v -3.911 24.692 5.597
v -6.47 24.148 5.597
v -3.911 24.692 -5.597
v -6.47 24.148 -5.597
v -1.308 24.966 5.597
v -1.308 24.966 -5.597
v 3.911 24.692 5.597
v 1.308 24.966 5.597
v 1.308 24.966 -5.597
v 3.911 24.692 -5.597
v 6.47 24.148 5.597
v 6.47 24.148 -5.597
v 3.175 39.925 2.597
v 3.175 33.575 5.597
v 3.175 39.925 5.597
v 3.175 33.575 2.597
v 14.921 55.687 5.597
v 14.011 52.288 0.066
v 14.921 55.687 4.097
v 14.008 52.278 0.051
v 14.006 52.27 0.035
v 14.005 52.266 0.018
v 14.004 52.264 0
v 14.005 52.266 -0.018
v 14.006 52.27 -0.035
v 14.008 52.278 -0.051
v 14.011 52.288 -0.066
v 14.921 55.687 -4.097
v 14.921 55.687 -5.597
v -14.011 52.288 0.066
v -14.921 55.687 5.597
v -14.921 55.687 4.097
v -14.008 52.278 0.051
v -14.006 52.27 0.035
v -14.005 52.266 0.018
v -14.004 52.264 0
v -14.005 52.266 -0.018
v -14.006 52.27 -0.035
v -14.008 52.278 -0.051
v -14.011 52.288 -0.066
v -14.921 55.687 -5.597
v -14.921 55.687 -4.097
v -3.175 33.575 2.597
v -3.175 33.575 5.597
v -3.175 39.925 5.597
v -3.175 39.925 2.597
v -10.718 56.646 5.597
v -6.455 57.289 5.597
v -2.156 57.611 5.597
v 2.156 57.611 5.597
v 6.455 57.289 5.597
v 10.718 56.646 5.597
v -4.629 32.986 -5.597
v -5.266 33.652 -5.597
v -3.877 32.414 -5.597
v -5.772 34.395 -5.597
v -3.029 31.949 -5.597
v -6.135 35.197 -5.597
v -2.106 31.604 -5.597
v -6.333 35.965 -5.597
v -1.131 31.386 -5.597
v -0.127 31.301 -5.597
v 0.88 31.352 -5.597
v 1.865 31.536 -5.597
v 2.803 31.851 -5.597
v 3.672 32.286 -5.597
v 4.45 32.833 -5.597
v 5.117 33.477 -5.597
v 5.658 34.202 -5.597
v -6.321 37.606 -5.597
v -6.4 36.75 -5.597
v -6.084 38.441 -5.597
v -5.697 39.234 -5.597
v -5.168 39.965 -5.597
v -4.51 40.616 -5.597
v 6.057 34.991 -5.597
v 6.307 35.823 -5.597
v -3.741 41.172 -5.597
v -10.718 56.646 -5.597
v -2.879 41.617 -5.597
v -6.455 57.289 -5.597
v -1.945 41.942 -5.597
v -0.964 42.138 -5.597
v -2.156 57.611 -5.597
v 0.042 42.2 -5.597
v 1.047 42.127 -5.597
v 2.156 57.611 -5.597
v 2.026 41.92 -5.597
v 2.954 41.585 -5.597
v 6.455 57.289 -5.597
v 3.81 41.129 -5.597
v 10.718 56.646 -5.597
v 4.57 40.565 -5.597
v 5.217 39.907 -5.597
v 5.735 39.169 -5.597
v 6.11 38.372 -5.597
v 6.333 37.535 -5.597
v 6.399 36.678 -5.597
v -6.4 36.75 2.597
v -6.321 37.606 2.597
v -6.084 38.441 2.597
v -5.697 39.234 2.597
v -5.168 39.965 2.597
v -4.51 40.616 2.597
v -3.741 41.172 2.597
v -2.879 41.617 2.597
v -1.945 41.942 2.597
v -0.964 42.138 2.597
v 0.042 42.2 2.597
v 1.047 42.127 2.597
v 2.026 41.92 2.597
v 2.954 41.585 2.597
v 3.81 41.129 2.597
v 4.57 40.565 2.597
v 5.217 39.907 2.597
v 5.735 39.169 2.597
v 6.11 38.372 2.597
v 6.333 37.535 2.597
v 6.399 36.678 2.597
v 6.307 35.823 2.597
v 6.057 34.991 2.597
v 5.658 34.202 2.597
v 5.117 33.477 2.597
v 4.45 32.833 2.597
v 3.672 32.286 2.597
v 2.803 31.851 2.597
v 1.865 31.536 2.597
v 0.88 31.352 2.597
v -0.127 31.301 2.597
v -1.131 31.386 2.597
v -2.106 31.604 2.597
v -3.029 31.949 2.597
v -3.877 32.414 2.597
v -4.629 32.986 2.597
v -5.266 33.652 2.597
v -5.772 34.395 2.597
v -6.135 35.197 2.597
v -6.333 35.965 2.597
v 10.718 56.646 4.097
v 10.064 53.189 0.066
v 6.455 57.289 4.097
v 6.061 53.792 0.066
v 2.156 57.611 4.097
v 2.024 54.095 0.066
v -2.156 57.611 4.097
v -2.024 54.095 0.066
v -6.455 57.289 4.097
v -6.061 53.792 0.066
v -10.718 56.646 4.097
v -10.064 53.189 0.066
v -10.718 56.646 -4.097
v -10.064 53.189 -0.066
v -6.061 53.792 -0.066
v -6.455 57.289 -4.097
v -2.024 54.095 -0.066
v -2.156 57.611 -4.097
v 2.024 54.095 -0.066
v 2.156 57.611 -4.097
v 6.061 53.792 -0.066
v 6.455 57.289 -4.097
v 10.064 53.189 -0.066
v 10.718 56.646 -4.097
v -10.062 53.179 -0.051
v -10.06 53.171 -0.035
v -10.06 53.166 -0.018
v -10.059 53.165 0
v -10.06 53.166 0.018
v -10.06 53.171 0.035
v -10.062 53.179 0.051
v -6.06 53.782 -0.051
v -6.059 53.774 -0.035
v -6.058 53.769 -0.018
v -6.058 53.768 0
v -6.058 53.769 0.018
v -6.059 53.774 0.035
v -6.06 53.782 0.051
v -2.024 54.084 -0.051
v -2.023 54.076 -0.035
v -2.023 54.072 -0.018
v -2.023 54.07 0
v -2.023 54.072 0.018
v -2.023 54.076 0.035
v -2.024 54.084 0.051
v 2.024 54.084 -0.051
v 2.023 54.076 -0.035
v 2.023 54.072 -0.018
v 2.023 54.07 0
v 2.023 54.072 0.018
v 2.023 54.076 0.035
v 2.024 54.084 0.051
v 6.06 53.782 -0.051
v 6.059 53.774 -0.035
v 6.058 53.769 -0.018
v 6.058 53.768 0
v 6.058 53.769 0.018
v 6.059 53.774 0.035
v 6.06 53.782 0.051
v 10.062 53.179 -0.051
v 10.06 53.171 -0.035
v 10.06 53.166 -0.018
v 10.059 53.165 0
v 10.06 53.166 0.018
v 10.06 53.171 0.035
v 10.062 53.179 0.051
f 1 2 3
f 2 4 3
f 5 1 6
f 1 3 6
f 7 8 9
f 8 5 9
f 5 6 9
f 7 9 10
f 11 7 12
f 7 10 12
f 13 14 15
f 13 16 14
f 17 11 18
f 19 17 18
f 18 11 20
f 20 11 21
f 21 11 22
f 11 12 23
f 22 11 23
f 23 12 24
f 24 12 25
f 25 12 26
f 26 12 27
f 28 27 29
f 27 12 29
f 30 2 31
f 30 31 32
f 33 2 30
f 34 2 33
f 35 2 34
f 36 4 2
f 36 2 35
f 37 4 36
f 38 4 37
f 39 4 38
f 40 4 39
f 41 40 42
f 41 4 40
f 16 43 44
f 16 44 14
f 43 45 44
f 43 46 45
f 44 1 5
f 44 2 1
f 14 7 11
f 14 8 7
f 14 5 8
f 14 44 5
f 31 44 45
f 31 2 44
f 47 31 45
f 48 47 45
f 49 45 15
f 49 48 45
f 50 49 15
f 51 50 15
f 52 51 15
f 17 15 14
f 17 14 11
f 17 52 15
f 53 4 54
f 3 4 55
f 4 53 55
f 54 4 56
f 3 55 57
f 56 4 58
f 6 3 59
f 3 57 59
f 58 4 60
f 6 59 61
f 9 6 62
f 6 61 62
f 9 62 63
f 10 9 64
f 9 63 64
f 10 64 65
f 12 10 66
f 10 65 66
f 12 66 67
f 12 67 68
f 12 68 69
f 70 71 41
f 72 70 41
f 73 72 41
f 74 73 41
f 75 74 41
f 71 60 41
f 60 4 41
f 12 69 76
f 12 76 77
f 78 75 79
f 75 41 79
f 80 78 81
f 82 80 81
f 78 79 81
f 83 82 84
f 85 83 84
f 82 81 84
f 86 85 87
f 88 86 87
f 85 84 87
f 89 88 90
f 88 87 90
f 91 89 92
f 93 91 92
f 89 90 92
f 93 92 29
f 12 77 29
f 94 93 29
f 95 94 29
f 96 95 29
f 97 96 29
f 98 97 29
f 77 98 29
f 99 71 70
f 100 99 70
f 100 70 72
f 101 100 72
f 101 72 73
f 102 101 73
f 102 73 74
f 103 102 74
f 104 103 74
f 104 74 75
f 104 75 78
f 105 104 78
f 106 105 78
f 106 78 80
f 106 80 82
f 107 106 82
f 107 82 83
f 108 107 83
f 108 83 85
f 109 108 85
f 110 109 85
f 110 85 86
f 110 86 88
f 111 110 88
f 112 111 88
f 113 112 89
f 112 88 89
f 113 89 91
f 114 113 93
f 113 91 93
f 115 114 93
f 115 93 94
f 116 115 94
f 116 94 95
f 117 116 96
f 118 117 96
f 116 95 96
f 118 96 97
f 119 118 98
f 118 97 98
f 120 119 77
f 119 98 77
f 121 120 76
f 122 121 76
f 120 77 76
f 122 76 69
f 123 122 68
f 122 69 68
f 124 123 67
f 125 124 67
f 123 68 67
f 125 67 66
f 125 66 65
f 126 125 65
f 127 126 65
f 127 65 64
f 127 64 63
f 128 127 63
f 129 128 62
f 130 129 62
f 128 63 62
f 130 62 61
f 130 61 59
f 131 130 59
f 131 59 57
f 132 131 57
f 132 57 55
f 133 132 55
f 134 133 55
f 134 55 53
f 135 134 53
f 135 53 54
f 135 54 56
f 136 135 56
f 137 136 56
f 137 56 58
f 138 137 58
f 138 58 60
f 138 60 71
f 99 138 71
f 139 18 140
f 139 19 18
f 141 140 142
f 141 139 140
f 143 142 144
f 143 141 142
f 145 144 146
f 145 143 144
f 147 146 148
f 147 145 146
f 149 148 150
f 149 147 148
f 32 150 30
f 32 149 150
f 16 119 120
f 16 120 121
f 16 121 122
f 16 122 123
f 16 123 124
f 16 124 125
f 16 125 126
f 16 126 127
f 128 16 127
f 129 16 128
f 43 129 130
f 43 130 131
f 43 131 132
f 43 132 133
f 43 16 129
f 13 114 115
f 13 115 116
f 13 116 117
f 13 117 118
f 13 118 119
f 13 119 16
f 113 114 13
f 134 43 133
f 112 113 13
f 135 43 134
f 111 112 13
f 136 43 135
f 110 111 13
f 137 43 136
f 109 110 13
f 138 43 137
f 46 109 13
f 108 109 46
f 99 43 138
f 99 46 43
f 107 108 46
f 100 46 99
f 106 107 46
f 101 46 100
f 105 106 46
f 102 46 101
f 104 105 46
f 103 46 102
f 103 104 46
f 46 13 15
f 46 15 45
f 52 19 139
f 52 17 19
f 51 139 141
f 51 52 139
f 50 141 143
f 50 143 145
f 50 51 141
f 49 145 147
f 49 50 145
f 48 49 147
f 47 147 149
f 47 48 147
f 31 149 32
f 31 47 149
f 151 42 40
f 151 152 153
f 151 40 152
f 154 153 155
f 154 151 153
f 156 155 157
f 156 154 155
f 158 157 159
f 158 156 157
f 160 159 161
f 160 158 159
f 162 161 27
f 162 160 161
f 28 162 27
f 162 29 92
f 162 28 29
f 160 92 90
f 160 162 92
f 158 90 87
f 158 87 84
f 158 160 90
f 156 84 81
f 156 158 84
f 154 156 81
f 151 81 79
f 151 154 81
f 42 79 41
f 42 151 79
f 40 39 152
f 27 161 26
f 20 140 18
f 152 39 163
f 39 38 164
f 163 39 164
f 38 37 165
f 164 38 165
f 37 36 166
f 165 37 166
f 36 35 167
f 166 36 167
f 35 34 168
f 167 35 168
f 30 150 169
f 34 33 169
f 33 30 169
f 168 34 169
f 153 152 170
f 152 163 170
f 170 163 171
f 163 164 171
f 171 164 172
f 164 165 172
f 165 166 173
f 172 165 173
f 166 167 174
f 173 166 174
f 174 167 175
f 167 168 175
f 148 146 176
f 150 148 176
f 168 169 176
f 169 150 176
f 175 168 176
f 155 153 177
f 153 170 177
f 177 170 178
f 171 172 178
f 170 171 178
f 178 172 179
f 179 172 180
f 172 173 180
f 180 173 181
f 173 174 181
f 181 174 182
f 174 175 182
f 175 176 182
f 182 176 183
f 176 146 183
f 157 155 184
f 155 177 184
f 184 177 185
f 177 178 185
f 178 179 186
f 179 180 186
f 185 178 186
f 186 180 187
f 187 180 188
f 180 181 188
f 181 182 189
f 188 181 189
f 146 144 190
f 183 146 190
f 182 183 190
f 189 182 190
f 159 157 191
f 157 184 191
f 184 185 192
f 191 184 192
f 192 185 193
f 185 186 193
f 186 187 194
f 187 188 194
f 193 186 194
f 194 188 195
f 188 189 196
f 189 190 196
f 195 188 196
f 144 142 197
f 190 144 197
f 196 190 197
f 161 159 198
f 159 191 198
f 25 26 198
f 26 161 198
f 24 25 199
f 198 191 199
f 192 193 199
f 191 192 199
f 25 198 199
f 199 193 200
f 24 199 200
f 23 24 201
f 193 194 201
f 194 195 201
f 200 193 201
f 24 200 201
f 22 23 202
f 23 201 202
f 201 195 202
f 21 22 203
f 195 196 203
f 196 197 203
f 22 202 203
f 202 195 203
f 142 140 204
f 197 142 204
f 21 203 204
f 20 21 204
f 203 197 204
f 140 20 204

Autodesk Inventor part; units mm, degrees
ref_plane "YZ Plane" through (0, 0, 0) normal (1, 0, 0) x (0, 1, 0)
ref_plane "XZ Plane" through (0, 0, 0) normal (0, 1, 0) x (-1, 0, 0)
sketch "Sketch1" plane through (0, 0, 0) normal (0, 0, 1) x (1, 0, 0)
  circle A0 centre (0, 0) radius 59.2469 construction
  line L0 (0, 0) -> (59.2469, 0)
  line L1 (0, 0) -> (59.2469, 4.025)
  line L2 (59.2469, 0) -> (59.2469, 4.025)
  circle A1 centre (0, 0) radius 75
  point P0 (56.8, 0)
  dimension "d56" = 59.2469
  dimension "d57" = 4.025
  dimension "d400" = 75
  dimension "d495" = 2.5
  dimension "d496" = 8
  dimension "d531" = 5.5
  dimension "d532" = 5.5
  dimension "d533" = 5.5
  dimension "d537" = 24.5
  dimension "d538" = 3
  dimension "d543" = 5.5
  dimension "d549" = 3
  dimension "d550" = 3
  dimension "d567" = 5.5
  dimension "d568" = 5.5
sketch "Sketch7" plane through (0, 0, 0) normal (0, 1, 0) x (-1, 0, 0)
  line L0 (0, 0) -> (0, 61.9844)
  line L1 (0, 0) -> (-59.2469, 0) construction
  line L2 (0, 61.9844) -> (-59.2469, 0) construction
  line L3 (0, 61.9844) -> (-64.8494, 0) construction
  line L4 (0, 61.9844) -> (-58.9939, -5.5968) construction
  line L5 (0, 0) -> (0, -61.9844)
  line L6 (0, -61.9844) -> (-59.2469, 0) construction
  line L7 (0, -61.9844) -> (-64.8494, 0) construction
  line L8 (0, -61.9844) -> (-58.9939, 5.5968) construction
  line L9 (-58.9939, 5.5968) -> (-64.8494, 0) construction
  line L10 (-54.1083, 0) -> (-62.8579, -8.363) construction
  line L11 (-54.1083, 0) -> (-38.773, -14.6579) construction
  line L12 (0, -94.3812) -> (0, 132.3969) projected
  line L13 (-75, -5.9919) -> (-75, 6.008)
  line L14 (105, 0) -> (-105, 0) projected
  line L15 (-62.0481, 2.6775) -> (-56.4456, -2.6775) construction
  line L16 (-56.4456, 2.6775) -> (-62.0481, -2.6775) construction
  line L17 (-26.151, -15.9303) -> (-40.3783, -15.9303) construction
  line L18 (-40.3783, -15.9303) -> (-40.3783, -12.7539) construction
  line L19 (-40.3783, -12.7539) -> (-26.151, -12.7539) construction
  line L20 (-26.151, -12.7539) -> (-26.151, -15.9303) construction
  point P0 (-75, 0)
  dimension "Roller_Side_difference" = -0.0002
  dimension "d90" = 61.9844
  dimension "d201" = 75
  dimension "d343" = 92.587
  dimension "d344" = 92.588
  dimension "d367" = 8.1
sketch "Roller1" plane through (0, 0, 0) normal (0, 1, 0) x (-1, 0, 0)
  line L0 (0, 61.9844) -> (-58.9939, -5.5968) construction
  line L1 (0, 61.9844) -> (-64.8494, 0) construction
  line L2 (-54.1083, 0) -> (-38.773, -14.6579) construction
  line L3 (0, -61.9844) -> (-64.8494, 0) construction
  line L4 (-54.0606, 0.0927) -> (-58.9462, -5.5041)
  line L5 (-58.9462, -5.5041) -> (-64.7589, 0.0519)
  line L6 (-64.7589, 0.0519) -> (-59.3884, 5.1851)
  line L7 (-59.3884, 5.1851) -> (-54.0606, 0.0927)
  line L8 (-56.0019, 1.9482) -> (-61.1299, -3.4168)
  line L9 (-61.8526, -2.7261) -> (-56.7246, 2.639)
  point P0 (0, 0)
  dimension "d345" = 0.025
  dimension "d346" = 0.025
  dimension "d347" = 0.1
  dimension "d348" = 0.1
  dimension "d349" = 272.588
  dimension "d350" = 272.587
  dimension "d617" = 0.9997
sketch "Roller2" plane through (0, 0, 0) normal (0, 1, 0) x (-1, 0, 0)
  line L0 (0, -61.9844) -> (-58.9939, 5.5968) construction
  line L1 (-54.1083, 0) -> (-62.8579, -8.363) construction
  line L2 (0, -61.9844) -> (-64.8494, 0) construction
  line L3 (0, 61.9844) -> (-64.8494, 0) construction
  line L4 (-58.9956, 5.5606) -> (-54.1429, 0.0016)
  line L5 (-54.1429, 0.0016) -> (-59.4789, -5.0987)
  line L6 (-59.4789, -5.0987) -> (-64.8132, 0)
  line L7 (-64.8132, 0) -> (-58.9956, 5.5606)
  line L8 (-61.9044, 2.7803) -> (-56.8109, -2.5486)
  line L9 (-61.1815, 3.4713) -> (-56.088, -1.8576)
  point P0 (0, 0)
  dimension "d351" = 0.025
  dimension "d352" = 0.025
  dimension "d354" = 0.025
  dimension "d355" = 92.587
  dimension "d356" = 92.588
  dimension "d370" = 0.025
  dimension "d371" = 1
sketch "Sketch22" plane through (0, 0, 0) normal (0, 1, 0) x (-1, 0, 0)
  line L0 (-31.756, 8.0215) -> (-17.5287, 8.0215) construction
  line L1 (-17.5287, 8.0215) -> (-17.5287, 4.8451) construction
  line L2 (-17.5287, 4.8451) -> (-31.756, 4.8451) construction
  line L3 (-31.756, 4.8451) -> (-31.756, 8.0215) construction
  point P0 (0, 0)
  dimension "Roller_Side_difference" = -0.0002
sketch "Sketch2" plane through (0, 0, 0) normal (0, 1, 0) x (-1, 0, 0)
  line L0 (0, 0) -> (0, 59.2469) construction
  line L1 (0, 0) -> (-59.2469, 0) projected
  line L2 (0, 0) -> (0, -59.2469)
  line L3 (0, -59.2469) -> (-59.2469, 0) construction
  line L4 (0, 59.2469) -> (-59.2469, 0) construction
  line L5 (-50.4879, 53.555) -> (0, 59.2469) construction
  line L6 (-29.7354, 7.189) -> (0, 59.2469) construction
  line L7 (-29.7354, 7.189) -> (0, -59.2469) construction
  line L8 (-48.8381, -26.254) -> (0, -59.2469) construction
  point P0 (-40.4258, 18.8211)
sketch "Sketch23" plane through (0, 0, 0) normal (0, 1, 0) x (-1, 0, 0)
  line L0 (0, -61.9844) -> (-58.9939, 5.5968) construction
  line L1 (0, -61.9844) -> (-64.8494, 0) construction
  line L2 (0, 61.9844) -> (-58.9939, -5.5968) construction
  line L3 (-58.9939, 5.5968) -> (-64.8494, 0) construction
  line L4 (0, 61.9844) -> (-64.8494, 0) construction
  line L5 (-58.9939, 5.5968) -> (-58.9939, -5.5968) construction
  line L6 (105, 0) -> (-105, 0) projected
  line L7 (-57.6514, 4.0968) -> (-54.1326, 0.0658)
  line L8 (-54.1326, -0.0658) -> (-57.6514, -4.0968)
  line L9 (-60.5995, 4.0968) -> (-64.81, 0.0723)
  line L10 (-64.81, -0.0723) -> (-60.5995, -4.0968)
  arc A0 (-64.81, 0.0723) -> (-64.81, -0.0723) centre (-64.7409, 0) ccw
  arc A1 (-54.1326, -0.0658) -> (-54.1326, 0.0658) centre (-54.2079, 0) ccw
  line L11 (-57.6514, 4.0968) -> (-57.6514, 5.5968)
  line L12 (-57.6514, 5.5968) -> (-25, 5.5968)
  line L13 (-25, 5.5968) -> (-25, -5.5968)
  line L14 (-25, -5.5968) -> (-57.6514, -5.5968)
  line L15 (-57.6514, -5.5968) -> (-57.6514, -4.0968)
  line L16 (-60.5995, 4.0968) -> (-60.5995, 5.5968)
  line L17 (-60.5995, 5.5968) -> (-75, 5.5968)
  line L18 (-75, 5.5968) -> (-75, -5.5968)
  line L19 (-60.5995, -4.0968) -> (-60.5995, -5.5968)
  line L20 (-60.5995, -5.5968) -> (-75, -5.5968)
  line L21 (-58.9939, 5.5968) -> (-58.9939, 5.5968)
  line L22 (-58.9939, -5.5968) -> (-58.9939, -5.5968)
  line L23 (0, -94.3812) -> (0, 132.3969) projected
  line L24 (-64.8856, 0) -> (-75, 0)
  point P0 (0, 0)
  point P1 (-54.0752, 0)
  point P2 (-64.8409, 0)
  point P3 (-75, 0)
  dimension "d378" = 90
  dimension "d379" = 0.1
  dimension "d380" = 0.025
  dimension "d381" = 0.025
  dimension "d382" = 0.025
  dimension "d383" = 0.025
  dimension "d384" = 11.1935
  dimension "d385" = 0
  dimension "d386" = 0
  dimension "d391" = 25
  dimension "d392" = 75
  dimension "d393" = 1.5
  dimension "d394" = 1.5
  dimension "d395" = 1.5
  dimension "d396" = 1.5
revolve "RevRoller1" [suppressed]
fillet "Fillet1" [suppressed]
sketch "Sketch48" plane through (56.7246, 0, 2.639) normal (-0.691, 0, 0.7229) x (0.7229, 0, 0.691)
  line L0 (-2.5, 0.25) -> (2.5, 0.25)
  line L1 (2.5, 0.25) -> (2.5, -0.25)
  line L2 (2.5, -0.25) -> (-2.5, -0.25)
  line L3 (-2.5, -0.25) -> (-2.5, 0.25)
  line L4 (-2.5, 0.25) -> (2.5, -0.25) construction
  line L5 (2.5, 0.25) -> (-2.5, -0.25) construction
  line L6 (-0.25, -2.5) -> (0.25, -2.5)
  line L7 (0.25, -2.5) -> (0.25, 2.5)
  line L8 (0.25, 2.5) -> (-0.25, 2.5)
  line L9 (-0.25, 2.5) -> (-0.25, -2.5)
  line L10 (-0.25, -2.5) -> (0.25, 2.5) construction
  line L11 (0.25, -2.5) -> (-0.25, 2.5) construction
  point P0 (-42.8293, 0)
  point P1 (0, 0)
  point P2 (-0.25, 0.25)
  point P3 (-0.25, -0.25)
  point P4 (0.25, -0.25)
  point P5 (0.25, 0.25)
  dimension "d621" = 5
  dimension "d622" = 0.5
  dimension "d623" = 0.5
  dimension "d624" = 5
extrude "Extrusion39" [suppressed]
sketch "Sketch40" plane through (0, 0, -5.231) normal (0, 0, -1) x (-1, 0, 0)
  circle A0 centre (53.5, 0) radius 2.75 projected
  circle A1 centre (0, 0) radius 53.5 projected
  point P0 (53.4293, 2.7491)
  point P1 (53.4293, -2.7491)
  dimension "d585" = 8
  dimension "d587" = 1.75
  dimension "d589" = 3
  dimension "d592" = 2
  dimension "d593" = 12
  dimension "d594" = 12
  dimension "d611" = 360
pattern_circular "Circular Pattern13" [suppressed]
feature "Move Body7" [suppressed]
revolve "Revolution13" [suppressed]
fillet "Fillet3" [suppressed]
pattern_circular "Circular Pattern14" [suppressed]
feature "Move Body6" [suppressed]
revolve "Revolution14" add sketch "Sketch23" angle 360 about axis through (0, 0, -10) along (0, 0, 1) contours A1 L7 L11 L12 L13 L6 | L6 L13 L14 L15 L8 A1
revolve "OuterRim_Top2" [suppressed]
revolve "OuterRim_Bottom2" [suppressed]
ref_plane "Work Plane8" through (0, 0, 20) normal (0, 0, 1) x (1, 0, 0)
sketch "Sketch49" plane through (0, 0, 20) normal (0, 0, 1) x (1, 0, 0)
  circle A0 centre (0, 0) radius 75 projected
  circle A1 centre (0, 0) radius 60.5995 projected
  circle A2 centre (0, 0) radius 57.6514 projected
  circle A3 centre (0, 0) radius 25 projected
  circle A4 centre (0, 0) radius 69
  circle A5 centre (0, 0) radius 36.75
  point P0 (0, 69)
  point P1 (0, 36.75)
  point P2 (-40.5572, 55.8222)
  dimension "d629" = 69
  dimension "d630" = 73.5
  dimension "d649" = 36
sketch "Sketch50" plane through (0, 0, 5.5968) normal (0, 0, 1) x (1, 0, 0)
  point P0 (0, 0)
  point P1 (0, 69)
sketch "Sketch51" plane through (0, 0, -5.5968) normal (0, 0, -1) x (-1, 0, 0)
  circle A0 centre (0, 0) radius 75 projected
  circle A1 centre (0, 69) radius 2.75
  circle A2 centre (0, 69) radius 1.5
  circle A3 centre (-40.5572, 55.8222) radius 3.5
  circle A4 centre (-40.5572, 55.8222) radius 2
  dimension "d633" = 36
  dimension "d635" = 5.5
  dimension "d636" = 3
  dimension "d637" = 7
  dimension "d638" = 4
extrude "Extrusion40" [suppressed]
extrude "Extrusion41" [suppressed]
extrude "Extrusion42" [suppressed]
extrude "Extrusion43" [suppressed]
sketch "Sketch52" plane through (0, 0, 5.5968) normal (0, 0, 1) x (1, 0, 0)
  circle A0 centre (0, 69) radius 1.5
  circle A1 centre (-40.5572, 55.8222) radius 2
  line L0 (2.75, 67.4123) -> (0, 65.8246)
  line L1 (0, 65.8246) -> (-2.75, 67.4123)
  line L2 (-2.75, 67.4123) -> (-2.75, 70.5877)
  line L3 (-2.75, 70.5877) -> (0, 72.1754)
  line L4 (0, 72.1754) -> (2.75, 70.5877)
  line L5 (2.75, 70.5877) -> (2.75, 67.4123)
  circle A2 centre (0, 0) radius 75 projected
  line L6 (-39.2656, 58.7231) -> (-37.3992, 56.1541)
  line L7 (-36.5379, 56.2446) -> (-38.1817, 52.5526)
  line L8 (-38.1817, 52.5526) -> (-42.201, 52.1301)
  line L9 (-42.201, 52.1301) -> (-44.5765, 55.3997)
  line L10 (-44.5765, 55.3997) -> (-42.9327, 59.0918)
  line L11 (-42.9327, 59.0918) -> (-38.9134, 59.5142)
  line L12 (-38.9134, 59.5142) -> (-36.5379, 56.2446)
  dimension "d651" = 3
  dimension "d652" = 4
  dimension "d655" = 36
  dimension "d657" = 7
  dimension "d658" = 5.5
extrude "Extrusion44" [suppressed]
extrude "Extrusion45" [suppressed]
extrude "Extrusion46" [suppressed]
extrude "Extrusion47" [suppressed]
pattern_circular "Circular Pattern32" [suppressed]
pattern_circular "Circular Pattern33" [suppressed]
sketch "Sketch57" plane through (0, 0, -5.5968) normal (0, 0, -1) x (-1, 0, 0)
  line L0 (-3.175, 39.925) -> (3.175, 39.925)
  line L1 (3.175, 39.925) -> (3.175, 33.575)
  line L2 (3.175, 33.575) -> (-3.175, 33.575)
  line L3 (-3.175, 33.575) -> (-3.175, 39.925)
  line L4 (-3.175, 39.925) -> (3.175, 33.575) construction
  line L5 (3.175, 39.925) -> (-3.175, 33.575) construction
  ellipse E0 centre (0, 36.75) end of major axis (6.4, 36.75) minor radius 5.45
  point P0 (0, 0)
  dimension "d694" = 6.35
  dimension "d695" = 6.35
  dimension "d696" = 6.4
  dimension "d697" = 5.45
extrude "Extrusion50" cut sketch "Sketch57" against normal blind 11.194 contours L0 L1 L2 L3
extrude "Extrusion51" cut sketch "Sketch57" against normal blind 8.194 contours L0 L1 L2 L3 | E0
pattern_circular "Circular Pattern34" count 6 over 360 about axis through (0, 0, -4.8468) along (0, 0, 1) of "Extrusion50", "Extrusion51"
ref_plane "Work Plane9" through (0, 0, -25) normal (0, 0, 1) x (1, 0, 0)
sketch "Sketch58" plane through (0, 0, -25) normal (0, 0, 1) x (1, 0, 0)
  line L0 (0, 0) -> (0, 94.5267)
  line L1 (0, 94.5267) -> (0, 0)
  line L2 (0, 0) -> (-27.705, 103.3964)
  line L3 (0, 0) -> (25.7729, 96.1857)
  circle A0 centre (0, 0) radius 95.9893
  point P0 (-24.8439, 92.7185)
  point P1 (24.8439, 92.7185)
  dimension "d706" = 15
  dimension "d707" = 15
extrude "Extrusion52" cut sketch "Sketch58" along normal through all contours L3 A0 L2 picked at (37.9953, -51.2872)
equation "\"Roller_Side_difference\" = -0.000942deg"
equation "\"Cycloid_Top_Plate_Fasner_Inner\" = 61.25"
equation "\"Cycloid_Top_Plate_Fasner_Outer\" = 85.75"
equation "\"Roller_Hole_Radius\" = 1"
equation "\"Distance_To_Bearing\" = 85.74529"
equation "\"d514\" = 0.2"
equation "\"Machine_Screw_4mm_Head_Dept\" = 4"
equation "\"Machine_Screw_4mm_Head_Diameter\" = 7"
equation "\"Machine_Screw_4mm_HexNut_Thickness\" = 3"
equation "\"Machine_Screw_4mm_HexNut_Width\" = 6.9"
equation "\"Machine_Screw_4mm_Length\" = 8"
equation "\"Fastner_4mm_Hex_Nut_Width\" = 7"
equation "\"Fastner_4mm_Screw_Diameter\" = 4"
equation "\"Fastner_4mm_Screw_Head_Diameter\" = 7"
equation "\"Fastner_4mm_Hex_Nut_Hole_Dept\" = 3.19352"
equation "\"Fastner_4mm_Screw_Head_Hole_Dept\" = 4"
properties part number "Section_Left_OuterBearing_TBS"
